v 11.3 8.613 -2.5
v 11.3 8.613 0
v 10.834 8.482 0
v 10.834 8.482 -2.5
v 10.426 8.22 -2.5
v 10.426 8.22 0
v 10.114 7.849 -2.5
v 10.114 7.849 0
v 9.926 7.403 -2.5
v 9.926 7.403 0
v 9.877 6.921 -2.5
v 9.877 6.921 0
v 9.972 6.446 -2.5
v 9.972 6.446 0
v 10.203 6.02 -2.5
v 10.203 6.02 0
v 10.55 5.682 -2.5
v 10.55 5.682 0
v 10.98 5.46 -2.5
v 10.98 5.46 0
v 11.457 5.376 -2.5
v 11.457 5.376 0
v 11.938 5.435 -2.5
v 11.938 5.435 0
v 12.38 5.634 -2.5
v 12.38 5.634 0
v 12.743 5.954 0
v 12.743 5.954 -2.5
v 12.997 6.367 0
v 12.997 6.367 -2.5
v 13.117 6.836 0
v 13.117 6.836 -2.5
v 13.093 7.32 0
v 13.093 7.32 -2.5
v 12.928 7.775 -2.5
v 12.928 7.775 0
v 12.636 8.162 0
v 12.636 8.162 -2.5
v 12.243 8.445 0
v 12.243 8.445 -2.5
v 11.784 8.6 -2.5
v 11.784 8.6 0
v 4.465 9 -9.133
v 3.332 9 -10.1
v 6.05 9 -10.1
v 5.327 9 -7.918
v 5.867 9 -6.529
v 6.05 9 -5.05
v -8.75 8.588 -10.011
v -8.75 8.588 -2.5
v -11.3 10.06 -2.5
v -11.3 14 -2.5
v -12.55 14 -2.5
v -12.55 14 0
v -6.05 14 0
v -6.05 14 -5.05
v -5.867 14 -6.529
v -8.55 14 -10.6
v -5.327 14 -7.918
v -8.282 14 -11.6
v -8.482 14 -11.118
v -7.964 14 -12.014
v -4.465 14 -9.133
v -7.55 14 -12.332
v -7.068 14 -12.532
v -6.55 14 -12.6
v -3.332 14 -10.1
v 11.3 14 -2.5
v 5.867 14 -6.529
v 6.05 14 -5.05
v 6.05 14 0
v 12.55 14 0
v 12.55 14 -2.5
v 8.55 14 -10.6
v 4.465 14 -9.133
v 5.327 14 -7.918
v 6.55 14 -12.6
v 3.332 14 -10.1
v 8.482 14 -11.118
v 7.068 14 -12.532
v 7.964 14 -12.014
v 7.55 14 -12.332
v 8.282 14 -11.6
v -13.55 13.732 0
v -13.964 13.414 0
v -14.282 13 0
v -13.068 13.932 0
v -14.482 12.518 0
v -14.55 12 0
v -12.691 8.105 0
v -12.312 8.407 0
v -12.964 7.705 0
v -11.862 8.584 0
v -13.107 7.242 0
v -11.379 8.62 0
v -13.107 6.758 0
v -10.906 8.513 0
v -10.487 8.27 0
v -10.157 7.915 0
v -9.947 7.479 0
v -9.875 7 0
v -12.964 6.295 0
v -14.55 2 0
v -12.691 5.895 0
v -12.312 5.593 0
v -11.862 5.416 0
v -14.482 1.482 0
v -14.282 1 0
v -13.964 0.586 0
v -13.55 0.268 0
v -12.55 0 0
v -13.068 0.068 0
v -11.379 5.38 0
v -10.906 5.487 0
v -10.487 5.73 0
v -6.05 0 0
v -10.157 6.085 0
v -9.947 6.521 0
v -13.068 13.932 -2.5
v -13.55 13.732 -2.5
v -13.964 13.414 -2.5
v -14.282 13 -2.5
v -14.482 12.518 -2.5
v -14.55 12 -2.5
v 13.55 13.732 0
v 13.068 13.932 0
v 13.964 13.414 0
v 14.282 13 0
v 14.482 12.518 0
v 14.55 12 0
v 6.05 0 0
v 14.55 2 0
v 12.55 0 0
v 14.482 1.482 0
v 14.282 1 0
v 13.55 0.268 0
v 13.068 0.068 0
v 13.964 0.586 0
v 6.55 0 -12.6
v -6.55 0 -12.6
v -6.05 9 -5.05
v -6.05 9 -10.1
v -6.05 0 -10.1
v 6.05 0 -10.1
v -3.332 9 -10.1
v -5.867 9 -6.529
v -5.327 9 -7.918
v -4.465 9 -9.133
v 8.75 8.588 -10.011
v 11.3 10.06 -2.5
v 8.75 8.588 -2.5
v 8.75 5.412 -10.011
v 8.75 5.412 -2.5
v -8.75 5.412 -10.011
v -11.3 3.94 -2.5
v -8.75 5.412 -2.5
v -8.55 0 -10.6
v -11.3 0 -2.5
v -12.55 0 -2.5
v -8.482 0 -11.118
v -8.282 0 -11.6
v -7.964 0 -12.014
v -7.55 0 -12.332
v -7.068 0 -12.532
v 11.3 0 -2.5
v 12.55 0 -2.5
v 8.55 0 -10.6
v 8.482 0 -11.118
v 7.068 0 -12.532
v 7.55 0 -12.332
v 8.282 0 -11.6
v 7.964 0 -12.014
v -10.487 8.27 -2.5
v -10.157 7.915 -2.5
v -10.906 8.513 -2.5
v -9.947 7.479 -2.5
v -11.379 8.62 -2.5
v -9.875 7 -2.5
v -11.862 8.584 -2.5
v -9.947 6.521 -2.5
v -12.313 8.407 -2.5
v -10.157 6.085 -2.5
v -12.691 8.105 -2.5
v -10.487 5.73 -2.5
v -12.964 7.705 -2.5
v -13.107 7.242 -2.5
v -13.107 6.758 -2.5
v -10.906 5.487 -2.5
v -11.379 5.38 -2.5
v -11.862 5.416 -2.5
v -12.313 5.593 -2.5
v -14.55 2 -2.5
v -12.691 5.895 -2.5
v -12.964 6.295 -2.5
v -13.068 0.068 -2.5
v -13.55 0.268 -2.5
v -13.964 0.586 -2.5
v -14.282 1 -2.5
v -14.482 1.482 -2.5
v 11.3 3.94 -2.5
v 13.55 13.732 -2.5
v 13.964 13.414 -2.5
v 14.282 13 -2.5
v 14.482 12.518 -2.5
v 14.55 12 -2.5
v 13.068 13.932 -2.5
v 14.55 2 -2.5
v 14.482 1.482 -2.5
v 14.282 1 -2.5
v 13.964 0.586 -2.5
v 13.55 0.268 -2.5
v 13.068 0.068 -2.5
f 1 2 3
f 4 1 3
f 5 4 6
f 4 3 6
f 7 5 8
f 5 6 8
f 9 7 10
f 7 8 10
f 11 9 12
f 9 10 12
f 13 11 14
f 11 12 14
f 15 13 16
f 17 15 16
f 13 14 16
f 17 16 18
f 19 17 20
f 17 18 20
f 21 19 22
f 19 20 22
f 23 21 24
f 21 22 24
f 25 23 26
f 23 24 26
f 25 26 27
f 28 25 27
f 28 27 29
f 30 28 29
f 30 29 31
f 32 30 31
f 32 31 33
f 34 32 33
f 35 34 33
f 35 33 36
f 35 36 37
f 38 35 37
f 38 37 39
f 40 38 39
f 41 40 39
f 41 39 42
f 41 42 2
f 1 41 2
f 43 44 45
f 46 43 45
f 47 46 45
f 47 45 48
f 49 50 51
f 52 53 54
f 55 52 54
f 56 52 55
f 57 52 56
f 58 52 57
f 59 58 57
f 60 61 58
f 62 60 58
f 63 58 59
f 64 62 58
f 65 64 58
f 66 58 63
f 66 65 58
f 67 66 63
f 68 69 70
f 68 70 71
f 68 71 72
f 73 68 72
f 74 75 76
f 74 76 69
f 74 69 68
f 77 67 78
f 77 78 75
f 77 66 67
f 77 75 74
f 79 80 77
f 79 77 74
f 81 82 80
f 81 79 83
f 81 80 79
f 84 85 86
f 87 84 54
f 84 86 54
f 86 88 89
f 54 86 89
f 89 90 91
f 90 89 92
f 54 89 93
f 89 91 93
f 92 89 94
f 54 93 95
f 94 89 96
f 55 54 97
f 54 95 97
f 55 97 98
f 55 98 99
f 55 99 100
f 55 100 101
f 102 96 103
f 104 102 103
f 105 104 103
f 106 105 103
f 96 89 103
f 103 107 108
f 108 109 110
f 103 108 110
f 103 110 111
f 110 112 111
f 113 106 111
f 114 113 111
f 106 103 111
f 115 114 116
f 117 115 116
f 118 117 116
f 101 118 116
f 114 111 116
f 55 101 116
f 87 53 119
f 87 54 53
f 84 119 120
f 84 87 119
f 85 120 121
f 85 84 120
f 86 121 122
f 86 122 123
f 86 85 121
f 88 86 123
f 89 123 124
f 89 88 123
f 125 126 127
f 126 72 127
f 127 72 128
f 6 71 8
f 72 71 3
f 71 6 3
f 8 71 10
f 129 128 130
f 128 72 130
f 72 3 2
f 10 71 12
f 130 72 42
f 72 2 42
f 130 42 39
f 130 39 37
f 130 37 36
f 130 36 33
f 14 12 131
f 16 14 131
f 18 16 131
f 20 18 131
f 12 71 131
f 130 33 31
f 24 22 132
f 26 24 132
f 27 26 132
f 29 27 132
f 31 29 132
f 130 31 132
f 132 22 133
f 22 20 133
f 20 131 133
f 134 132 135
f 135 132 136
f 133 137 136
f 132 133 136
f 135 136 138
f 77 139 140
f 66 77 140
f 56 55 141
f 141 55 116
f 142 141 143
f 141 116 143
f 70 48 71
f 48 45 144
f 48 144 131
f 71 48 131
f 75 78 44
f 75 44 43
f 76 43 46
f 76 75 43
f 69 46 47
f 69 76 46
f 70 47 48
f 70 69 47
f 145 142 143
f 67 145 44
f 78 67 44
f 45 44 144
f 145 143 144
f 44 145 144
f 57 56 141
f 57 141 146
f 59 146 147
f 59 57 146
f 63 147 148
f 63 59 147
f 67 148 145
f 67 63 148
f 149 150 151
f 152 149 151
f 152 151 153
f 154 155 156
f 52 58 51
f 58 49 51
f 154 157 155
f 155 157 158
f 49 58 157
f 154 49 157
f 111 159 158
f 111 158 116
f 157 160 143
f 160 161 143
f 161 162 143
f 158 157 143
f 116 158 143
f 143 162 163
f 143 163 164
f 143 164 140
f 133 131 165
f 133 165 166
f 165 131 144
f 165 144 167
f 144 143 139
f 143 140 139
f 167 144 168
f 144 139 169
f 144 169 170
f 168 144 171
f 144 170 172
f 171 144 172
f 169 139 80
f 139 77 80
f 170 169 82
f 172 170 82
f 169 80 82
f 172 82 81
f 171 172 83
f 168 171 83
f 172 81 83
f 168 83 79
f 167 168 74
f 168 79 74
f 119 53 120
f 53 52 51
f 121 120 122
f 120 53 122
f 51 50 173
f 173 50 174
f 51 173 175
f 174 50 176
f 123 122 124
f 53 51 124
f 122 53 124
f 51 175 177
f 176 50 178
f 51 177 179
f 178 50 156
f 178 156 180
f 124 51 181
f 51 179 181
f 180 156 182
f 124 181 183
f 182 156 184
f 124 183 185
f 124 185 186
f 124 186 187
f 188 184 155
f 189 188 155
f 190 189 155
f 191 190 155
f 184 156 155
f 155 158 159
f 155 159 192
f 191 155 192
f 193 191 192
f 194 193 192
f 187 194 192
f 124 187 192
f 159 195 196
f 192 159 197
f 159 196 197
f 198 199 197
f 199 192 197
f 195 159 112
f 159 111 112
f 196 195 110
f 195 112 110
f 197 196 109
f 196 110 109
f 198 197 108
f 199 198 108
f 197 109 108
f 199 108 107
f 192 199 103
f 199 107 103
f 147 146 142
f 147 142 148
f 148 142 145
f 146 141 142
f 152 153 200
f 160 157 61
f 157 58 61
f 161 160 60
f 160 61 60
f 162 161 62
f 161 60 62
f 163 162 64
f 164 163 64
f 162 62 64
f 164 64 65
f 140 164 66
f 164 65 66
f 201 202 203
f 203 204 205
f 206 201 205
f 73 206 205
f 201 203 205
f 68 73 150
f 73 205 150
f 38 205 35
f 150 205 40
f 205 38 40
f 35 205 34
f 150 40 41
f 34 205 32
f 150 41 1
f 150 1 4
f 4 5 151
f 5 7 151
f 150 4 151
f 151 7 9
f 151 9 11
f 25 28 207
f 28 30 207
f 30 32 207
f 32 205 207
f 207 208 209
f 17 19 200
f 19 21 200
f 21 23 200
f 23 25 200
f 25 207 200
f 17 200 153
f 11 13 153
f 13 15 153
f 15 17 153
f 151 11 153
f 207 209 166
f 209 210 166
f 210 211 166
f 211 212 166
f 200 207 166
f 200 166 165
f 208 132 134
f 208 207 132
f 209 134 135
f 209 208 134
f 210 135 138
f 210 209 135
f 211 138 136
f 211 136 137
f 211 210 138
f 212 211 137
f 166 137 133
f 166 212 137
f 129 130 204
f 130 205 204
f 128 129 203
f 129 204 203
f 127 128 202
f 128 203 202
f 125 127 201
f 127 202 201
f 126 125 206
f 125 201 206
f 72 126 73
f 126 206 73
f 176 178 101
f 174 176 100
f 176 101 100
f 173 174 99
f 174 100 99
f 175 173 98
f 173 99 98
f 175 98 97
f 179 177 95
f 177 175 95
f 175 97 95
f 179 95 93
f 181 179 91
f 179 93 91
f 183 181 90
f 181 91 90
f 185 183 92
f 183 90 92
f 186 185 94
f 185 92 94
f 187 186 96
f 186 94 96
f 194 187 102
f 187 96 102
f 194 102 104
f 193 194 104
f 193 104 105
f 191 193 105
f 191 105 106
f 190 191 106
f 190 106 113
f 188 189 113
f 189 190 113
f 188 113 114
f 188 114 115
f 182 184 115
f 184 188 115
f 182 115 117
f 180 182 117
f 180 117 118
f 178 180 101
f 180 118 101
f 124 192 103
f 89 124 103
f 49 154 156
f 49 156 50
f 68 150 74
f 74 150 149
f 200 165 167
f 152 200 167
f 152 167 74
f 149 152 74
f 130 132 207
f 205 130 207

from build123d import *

# Parameters (mm, degrees)
CUERPO_BASE_DEPTH          = 14
CROQUIS2_R                 = 1.625
AGUJEROS_DE_SUJECION_DEPTH = 14
TUERCAS_START              = -2.5
TUERCAS_DEPTH              = 22.300472684
REDONDEO_BORDES_R          = 2
SALIENTE_EXTRUIR2_DEPTH    = 5


with BuildPart() as part:
    # Croquis1 → Cuerpo Base (new body)
    with BuildSketch(Plane(origin=(0, 0, 0), x_dir=(1, 0, 0), z_dir=(0, 1, 0))):
        Polygon((-14.55, 0), (-6.05, 0), (-6.05, 10.1), (0, 10.1), (0, 12.6), (-8.55, 12.6), (-8.55, 10.6), (-8.55, 2.5), (-11.3, 2.5), (-14.55, 2.5), align=None)
        Polygon((-8.55, 10.6), (-11.3, 2.5), (-8.55, 2.5), align=None)
        Polygon((0, 12.6), (0, 10.1), (6.05, 10.1), (6.05, 0), (14.55, 0), (14.55, 2.5), (11.3, 2.5), (8.55, 2.5), (8.55, 10.6), (8.55, 12.6), align=None)
        Polygon((11.3, 2.5), (8.55, 10.6), (8.55, 2.5), align=None)
    extrude(amount=CUERPO_BASE_DEPTH)

    # Croquis2 → Agujeros de sujecion (cut)
    with BuildSketch(Plane.XY):
        with Locations((-11.5, 7)):
            Circle(CROQUIS2_R)
        with Locations(Location((11.5, 7, 0), (0, 0, 97.069714042))):
            Circle(CROQUIS2_R)
    extrude(amount=-AGUJEROS_DE_SUJECION_DEPTH, mode=Mode.SUBTRACT)

    # Croquis3 → Tuercas (cut, through all)
    with BuildSketch(Plane.XY.offset(TUERCAS_START)):
        Polygon((-14.25, 5.41228676), (-11.5, 3.824573519), (-8.75, 5.41228676), (-8.75, 8.58771324), (-11.5, 10.175426481), (-14.25, 8.58771324), align=None)
        Polygon((11.5, 3.824573519), (14.25, 5.41228676), (14.25, 8.58771324), (11.5, 10.175426481), (8.75, 8.58771324), (8.75, 5.41228676), align=None)
    extrude(amount=-TUERCAS_DEPTH, mode=Mode.SUBTRACT)

    # Redondeo bordes
    redondeo_bordes_edges = [part.edges().sort_by_distance(p)[0] for p in [
        (-8.55, 7, -12.6),
        (8.55, 7, -12.6),
        (14.55, 0, -1.25),
        (14.55, 14, -1.25),
        (-14.55, 0, -1.25),
        (-14.55, 14, -1.25),
    ]]
    fillet(redondeo_bordes_edges, radius=REDONDEO_BORDES_R - 0.0001)  # a hair under: the kernel refuses the full size

    # Croquis4 → Saliente-Extruir2 (add)
    with BuildSketch(Plane(origin=(0, 14, 0), x_dir=(1, 0, 0), z_dir=(0, 1, 0))):
        with BuildLine():
            Line((-3.33166625, 10.1), (-6.05, 10.1))
            Line((-6.05, 10.1), (-6.05, 5.05))
            ThreePointArc((-6.05, 5.05), (-5.327245105, 7.917570329), (-3.33166625, 10.1))
        make_face()
        with BuildLine():
            Line((6.05, 10.1), (3.33166625, 10.1))
            ThreePointArc((3.33166625, 10.1), (5.327245105, 7.917570329), (6.05, 5.05))
            Line((6.05, 5.05), (6.05, 10.1))
        make_face()
    extrude(amount=-SALIENTE_EXTRUIR2_DEPTH)


solid = part.part
